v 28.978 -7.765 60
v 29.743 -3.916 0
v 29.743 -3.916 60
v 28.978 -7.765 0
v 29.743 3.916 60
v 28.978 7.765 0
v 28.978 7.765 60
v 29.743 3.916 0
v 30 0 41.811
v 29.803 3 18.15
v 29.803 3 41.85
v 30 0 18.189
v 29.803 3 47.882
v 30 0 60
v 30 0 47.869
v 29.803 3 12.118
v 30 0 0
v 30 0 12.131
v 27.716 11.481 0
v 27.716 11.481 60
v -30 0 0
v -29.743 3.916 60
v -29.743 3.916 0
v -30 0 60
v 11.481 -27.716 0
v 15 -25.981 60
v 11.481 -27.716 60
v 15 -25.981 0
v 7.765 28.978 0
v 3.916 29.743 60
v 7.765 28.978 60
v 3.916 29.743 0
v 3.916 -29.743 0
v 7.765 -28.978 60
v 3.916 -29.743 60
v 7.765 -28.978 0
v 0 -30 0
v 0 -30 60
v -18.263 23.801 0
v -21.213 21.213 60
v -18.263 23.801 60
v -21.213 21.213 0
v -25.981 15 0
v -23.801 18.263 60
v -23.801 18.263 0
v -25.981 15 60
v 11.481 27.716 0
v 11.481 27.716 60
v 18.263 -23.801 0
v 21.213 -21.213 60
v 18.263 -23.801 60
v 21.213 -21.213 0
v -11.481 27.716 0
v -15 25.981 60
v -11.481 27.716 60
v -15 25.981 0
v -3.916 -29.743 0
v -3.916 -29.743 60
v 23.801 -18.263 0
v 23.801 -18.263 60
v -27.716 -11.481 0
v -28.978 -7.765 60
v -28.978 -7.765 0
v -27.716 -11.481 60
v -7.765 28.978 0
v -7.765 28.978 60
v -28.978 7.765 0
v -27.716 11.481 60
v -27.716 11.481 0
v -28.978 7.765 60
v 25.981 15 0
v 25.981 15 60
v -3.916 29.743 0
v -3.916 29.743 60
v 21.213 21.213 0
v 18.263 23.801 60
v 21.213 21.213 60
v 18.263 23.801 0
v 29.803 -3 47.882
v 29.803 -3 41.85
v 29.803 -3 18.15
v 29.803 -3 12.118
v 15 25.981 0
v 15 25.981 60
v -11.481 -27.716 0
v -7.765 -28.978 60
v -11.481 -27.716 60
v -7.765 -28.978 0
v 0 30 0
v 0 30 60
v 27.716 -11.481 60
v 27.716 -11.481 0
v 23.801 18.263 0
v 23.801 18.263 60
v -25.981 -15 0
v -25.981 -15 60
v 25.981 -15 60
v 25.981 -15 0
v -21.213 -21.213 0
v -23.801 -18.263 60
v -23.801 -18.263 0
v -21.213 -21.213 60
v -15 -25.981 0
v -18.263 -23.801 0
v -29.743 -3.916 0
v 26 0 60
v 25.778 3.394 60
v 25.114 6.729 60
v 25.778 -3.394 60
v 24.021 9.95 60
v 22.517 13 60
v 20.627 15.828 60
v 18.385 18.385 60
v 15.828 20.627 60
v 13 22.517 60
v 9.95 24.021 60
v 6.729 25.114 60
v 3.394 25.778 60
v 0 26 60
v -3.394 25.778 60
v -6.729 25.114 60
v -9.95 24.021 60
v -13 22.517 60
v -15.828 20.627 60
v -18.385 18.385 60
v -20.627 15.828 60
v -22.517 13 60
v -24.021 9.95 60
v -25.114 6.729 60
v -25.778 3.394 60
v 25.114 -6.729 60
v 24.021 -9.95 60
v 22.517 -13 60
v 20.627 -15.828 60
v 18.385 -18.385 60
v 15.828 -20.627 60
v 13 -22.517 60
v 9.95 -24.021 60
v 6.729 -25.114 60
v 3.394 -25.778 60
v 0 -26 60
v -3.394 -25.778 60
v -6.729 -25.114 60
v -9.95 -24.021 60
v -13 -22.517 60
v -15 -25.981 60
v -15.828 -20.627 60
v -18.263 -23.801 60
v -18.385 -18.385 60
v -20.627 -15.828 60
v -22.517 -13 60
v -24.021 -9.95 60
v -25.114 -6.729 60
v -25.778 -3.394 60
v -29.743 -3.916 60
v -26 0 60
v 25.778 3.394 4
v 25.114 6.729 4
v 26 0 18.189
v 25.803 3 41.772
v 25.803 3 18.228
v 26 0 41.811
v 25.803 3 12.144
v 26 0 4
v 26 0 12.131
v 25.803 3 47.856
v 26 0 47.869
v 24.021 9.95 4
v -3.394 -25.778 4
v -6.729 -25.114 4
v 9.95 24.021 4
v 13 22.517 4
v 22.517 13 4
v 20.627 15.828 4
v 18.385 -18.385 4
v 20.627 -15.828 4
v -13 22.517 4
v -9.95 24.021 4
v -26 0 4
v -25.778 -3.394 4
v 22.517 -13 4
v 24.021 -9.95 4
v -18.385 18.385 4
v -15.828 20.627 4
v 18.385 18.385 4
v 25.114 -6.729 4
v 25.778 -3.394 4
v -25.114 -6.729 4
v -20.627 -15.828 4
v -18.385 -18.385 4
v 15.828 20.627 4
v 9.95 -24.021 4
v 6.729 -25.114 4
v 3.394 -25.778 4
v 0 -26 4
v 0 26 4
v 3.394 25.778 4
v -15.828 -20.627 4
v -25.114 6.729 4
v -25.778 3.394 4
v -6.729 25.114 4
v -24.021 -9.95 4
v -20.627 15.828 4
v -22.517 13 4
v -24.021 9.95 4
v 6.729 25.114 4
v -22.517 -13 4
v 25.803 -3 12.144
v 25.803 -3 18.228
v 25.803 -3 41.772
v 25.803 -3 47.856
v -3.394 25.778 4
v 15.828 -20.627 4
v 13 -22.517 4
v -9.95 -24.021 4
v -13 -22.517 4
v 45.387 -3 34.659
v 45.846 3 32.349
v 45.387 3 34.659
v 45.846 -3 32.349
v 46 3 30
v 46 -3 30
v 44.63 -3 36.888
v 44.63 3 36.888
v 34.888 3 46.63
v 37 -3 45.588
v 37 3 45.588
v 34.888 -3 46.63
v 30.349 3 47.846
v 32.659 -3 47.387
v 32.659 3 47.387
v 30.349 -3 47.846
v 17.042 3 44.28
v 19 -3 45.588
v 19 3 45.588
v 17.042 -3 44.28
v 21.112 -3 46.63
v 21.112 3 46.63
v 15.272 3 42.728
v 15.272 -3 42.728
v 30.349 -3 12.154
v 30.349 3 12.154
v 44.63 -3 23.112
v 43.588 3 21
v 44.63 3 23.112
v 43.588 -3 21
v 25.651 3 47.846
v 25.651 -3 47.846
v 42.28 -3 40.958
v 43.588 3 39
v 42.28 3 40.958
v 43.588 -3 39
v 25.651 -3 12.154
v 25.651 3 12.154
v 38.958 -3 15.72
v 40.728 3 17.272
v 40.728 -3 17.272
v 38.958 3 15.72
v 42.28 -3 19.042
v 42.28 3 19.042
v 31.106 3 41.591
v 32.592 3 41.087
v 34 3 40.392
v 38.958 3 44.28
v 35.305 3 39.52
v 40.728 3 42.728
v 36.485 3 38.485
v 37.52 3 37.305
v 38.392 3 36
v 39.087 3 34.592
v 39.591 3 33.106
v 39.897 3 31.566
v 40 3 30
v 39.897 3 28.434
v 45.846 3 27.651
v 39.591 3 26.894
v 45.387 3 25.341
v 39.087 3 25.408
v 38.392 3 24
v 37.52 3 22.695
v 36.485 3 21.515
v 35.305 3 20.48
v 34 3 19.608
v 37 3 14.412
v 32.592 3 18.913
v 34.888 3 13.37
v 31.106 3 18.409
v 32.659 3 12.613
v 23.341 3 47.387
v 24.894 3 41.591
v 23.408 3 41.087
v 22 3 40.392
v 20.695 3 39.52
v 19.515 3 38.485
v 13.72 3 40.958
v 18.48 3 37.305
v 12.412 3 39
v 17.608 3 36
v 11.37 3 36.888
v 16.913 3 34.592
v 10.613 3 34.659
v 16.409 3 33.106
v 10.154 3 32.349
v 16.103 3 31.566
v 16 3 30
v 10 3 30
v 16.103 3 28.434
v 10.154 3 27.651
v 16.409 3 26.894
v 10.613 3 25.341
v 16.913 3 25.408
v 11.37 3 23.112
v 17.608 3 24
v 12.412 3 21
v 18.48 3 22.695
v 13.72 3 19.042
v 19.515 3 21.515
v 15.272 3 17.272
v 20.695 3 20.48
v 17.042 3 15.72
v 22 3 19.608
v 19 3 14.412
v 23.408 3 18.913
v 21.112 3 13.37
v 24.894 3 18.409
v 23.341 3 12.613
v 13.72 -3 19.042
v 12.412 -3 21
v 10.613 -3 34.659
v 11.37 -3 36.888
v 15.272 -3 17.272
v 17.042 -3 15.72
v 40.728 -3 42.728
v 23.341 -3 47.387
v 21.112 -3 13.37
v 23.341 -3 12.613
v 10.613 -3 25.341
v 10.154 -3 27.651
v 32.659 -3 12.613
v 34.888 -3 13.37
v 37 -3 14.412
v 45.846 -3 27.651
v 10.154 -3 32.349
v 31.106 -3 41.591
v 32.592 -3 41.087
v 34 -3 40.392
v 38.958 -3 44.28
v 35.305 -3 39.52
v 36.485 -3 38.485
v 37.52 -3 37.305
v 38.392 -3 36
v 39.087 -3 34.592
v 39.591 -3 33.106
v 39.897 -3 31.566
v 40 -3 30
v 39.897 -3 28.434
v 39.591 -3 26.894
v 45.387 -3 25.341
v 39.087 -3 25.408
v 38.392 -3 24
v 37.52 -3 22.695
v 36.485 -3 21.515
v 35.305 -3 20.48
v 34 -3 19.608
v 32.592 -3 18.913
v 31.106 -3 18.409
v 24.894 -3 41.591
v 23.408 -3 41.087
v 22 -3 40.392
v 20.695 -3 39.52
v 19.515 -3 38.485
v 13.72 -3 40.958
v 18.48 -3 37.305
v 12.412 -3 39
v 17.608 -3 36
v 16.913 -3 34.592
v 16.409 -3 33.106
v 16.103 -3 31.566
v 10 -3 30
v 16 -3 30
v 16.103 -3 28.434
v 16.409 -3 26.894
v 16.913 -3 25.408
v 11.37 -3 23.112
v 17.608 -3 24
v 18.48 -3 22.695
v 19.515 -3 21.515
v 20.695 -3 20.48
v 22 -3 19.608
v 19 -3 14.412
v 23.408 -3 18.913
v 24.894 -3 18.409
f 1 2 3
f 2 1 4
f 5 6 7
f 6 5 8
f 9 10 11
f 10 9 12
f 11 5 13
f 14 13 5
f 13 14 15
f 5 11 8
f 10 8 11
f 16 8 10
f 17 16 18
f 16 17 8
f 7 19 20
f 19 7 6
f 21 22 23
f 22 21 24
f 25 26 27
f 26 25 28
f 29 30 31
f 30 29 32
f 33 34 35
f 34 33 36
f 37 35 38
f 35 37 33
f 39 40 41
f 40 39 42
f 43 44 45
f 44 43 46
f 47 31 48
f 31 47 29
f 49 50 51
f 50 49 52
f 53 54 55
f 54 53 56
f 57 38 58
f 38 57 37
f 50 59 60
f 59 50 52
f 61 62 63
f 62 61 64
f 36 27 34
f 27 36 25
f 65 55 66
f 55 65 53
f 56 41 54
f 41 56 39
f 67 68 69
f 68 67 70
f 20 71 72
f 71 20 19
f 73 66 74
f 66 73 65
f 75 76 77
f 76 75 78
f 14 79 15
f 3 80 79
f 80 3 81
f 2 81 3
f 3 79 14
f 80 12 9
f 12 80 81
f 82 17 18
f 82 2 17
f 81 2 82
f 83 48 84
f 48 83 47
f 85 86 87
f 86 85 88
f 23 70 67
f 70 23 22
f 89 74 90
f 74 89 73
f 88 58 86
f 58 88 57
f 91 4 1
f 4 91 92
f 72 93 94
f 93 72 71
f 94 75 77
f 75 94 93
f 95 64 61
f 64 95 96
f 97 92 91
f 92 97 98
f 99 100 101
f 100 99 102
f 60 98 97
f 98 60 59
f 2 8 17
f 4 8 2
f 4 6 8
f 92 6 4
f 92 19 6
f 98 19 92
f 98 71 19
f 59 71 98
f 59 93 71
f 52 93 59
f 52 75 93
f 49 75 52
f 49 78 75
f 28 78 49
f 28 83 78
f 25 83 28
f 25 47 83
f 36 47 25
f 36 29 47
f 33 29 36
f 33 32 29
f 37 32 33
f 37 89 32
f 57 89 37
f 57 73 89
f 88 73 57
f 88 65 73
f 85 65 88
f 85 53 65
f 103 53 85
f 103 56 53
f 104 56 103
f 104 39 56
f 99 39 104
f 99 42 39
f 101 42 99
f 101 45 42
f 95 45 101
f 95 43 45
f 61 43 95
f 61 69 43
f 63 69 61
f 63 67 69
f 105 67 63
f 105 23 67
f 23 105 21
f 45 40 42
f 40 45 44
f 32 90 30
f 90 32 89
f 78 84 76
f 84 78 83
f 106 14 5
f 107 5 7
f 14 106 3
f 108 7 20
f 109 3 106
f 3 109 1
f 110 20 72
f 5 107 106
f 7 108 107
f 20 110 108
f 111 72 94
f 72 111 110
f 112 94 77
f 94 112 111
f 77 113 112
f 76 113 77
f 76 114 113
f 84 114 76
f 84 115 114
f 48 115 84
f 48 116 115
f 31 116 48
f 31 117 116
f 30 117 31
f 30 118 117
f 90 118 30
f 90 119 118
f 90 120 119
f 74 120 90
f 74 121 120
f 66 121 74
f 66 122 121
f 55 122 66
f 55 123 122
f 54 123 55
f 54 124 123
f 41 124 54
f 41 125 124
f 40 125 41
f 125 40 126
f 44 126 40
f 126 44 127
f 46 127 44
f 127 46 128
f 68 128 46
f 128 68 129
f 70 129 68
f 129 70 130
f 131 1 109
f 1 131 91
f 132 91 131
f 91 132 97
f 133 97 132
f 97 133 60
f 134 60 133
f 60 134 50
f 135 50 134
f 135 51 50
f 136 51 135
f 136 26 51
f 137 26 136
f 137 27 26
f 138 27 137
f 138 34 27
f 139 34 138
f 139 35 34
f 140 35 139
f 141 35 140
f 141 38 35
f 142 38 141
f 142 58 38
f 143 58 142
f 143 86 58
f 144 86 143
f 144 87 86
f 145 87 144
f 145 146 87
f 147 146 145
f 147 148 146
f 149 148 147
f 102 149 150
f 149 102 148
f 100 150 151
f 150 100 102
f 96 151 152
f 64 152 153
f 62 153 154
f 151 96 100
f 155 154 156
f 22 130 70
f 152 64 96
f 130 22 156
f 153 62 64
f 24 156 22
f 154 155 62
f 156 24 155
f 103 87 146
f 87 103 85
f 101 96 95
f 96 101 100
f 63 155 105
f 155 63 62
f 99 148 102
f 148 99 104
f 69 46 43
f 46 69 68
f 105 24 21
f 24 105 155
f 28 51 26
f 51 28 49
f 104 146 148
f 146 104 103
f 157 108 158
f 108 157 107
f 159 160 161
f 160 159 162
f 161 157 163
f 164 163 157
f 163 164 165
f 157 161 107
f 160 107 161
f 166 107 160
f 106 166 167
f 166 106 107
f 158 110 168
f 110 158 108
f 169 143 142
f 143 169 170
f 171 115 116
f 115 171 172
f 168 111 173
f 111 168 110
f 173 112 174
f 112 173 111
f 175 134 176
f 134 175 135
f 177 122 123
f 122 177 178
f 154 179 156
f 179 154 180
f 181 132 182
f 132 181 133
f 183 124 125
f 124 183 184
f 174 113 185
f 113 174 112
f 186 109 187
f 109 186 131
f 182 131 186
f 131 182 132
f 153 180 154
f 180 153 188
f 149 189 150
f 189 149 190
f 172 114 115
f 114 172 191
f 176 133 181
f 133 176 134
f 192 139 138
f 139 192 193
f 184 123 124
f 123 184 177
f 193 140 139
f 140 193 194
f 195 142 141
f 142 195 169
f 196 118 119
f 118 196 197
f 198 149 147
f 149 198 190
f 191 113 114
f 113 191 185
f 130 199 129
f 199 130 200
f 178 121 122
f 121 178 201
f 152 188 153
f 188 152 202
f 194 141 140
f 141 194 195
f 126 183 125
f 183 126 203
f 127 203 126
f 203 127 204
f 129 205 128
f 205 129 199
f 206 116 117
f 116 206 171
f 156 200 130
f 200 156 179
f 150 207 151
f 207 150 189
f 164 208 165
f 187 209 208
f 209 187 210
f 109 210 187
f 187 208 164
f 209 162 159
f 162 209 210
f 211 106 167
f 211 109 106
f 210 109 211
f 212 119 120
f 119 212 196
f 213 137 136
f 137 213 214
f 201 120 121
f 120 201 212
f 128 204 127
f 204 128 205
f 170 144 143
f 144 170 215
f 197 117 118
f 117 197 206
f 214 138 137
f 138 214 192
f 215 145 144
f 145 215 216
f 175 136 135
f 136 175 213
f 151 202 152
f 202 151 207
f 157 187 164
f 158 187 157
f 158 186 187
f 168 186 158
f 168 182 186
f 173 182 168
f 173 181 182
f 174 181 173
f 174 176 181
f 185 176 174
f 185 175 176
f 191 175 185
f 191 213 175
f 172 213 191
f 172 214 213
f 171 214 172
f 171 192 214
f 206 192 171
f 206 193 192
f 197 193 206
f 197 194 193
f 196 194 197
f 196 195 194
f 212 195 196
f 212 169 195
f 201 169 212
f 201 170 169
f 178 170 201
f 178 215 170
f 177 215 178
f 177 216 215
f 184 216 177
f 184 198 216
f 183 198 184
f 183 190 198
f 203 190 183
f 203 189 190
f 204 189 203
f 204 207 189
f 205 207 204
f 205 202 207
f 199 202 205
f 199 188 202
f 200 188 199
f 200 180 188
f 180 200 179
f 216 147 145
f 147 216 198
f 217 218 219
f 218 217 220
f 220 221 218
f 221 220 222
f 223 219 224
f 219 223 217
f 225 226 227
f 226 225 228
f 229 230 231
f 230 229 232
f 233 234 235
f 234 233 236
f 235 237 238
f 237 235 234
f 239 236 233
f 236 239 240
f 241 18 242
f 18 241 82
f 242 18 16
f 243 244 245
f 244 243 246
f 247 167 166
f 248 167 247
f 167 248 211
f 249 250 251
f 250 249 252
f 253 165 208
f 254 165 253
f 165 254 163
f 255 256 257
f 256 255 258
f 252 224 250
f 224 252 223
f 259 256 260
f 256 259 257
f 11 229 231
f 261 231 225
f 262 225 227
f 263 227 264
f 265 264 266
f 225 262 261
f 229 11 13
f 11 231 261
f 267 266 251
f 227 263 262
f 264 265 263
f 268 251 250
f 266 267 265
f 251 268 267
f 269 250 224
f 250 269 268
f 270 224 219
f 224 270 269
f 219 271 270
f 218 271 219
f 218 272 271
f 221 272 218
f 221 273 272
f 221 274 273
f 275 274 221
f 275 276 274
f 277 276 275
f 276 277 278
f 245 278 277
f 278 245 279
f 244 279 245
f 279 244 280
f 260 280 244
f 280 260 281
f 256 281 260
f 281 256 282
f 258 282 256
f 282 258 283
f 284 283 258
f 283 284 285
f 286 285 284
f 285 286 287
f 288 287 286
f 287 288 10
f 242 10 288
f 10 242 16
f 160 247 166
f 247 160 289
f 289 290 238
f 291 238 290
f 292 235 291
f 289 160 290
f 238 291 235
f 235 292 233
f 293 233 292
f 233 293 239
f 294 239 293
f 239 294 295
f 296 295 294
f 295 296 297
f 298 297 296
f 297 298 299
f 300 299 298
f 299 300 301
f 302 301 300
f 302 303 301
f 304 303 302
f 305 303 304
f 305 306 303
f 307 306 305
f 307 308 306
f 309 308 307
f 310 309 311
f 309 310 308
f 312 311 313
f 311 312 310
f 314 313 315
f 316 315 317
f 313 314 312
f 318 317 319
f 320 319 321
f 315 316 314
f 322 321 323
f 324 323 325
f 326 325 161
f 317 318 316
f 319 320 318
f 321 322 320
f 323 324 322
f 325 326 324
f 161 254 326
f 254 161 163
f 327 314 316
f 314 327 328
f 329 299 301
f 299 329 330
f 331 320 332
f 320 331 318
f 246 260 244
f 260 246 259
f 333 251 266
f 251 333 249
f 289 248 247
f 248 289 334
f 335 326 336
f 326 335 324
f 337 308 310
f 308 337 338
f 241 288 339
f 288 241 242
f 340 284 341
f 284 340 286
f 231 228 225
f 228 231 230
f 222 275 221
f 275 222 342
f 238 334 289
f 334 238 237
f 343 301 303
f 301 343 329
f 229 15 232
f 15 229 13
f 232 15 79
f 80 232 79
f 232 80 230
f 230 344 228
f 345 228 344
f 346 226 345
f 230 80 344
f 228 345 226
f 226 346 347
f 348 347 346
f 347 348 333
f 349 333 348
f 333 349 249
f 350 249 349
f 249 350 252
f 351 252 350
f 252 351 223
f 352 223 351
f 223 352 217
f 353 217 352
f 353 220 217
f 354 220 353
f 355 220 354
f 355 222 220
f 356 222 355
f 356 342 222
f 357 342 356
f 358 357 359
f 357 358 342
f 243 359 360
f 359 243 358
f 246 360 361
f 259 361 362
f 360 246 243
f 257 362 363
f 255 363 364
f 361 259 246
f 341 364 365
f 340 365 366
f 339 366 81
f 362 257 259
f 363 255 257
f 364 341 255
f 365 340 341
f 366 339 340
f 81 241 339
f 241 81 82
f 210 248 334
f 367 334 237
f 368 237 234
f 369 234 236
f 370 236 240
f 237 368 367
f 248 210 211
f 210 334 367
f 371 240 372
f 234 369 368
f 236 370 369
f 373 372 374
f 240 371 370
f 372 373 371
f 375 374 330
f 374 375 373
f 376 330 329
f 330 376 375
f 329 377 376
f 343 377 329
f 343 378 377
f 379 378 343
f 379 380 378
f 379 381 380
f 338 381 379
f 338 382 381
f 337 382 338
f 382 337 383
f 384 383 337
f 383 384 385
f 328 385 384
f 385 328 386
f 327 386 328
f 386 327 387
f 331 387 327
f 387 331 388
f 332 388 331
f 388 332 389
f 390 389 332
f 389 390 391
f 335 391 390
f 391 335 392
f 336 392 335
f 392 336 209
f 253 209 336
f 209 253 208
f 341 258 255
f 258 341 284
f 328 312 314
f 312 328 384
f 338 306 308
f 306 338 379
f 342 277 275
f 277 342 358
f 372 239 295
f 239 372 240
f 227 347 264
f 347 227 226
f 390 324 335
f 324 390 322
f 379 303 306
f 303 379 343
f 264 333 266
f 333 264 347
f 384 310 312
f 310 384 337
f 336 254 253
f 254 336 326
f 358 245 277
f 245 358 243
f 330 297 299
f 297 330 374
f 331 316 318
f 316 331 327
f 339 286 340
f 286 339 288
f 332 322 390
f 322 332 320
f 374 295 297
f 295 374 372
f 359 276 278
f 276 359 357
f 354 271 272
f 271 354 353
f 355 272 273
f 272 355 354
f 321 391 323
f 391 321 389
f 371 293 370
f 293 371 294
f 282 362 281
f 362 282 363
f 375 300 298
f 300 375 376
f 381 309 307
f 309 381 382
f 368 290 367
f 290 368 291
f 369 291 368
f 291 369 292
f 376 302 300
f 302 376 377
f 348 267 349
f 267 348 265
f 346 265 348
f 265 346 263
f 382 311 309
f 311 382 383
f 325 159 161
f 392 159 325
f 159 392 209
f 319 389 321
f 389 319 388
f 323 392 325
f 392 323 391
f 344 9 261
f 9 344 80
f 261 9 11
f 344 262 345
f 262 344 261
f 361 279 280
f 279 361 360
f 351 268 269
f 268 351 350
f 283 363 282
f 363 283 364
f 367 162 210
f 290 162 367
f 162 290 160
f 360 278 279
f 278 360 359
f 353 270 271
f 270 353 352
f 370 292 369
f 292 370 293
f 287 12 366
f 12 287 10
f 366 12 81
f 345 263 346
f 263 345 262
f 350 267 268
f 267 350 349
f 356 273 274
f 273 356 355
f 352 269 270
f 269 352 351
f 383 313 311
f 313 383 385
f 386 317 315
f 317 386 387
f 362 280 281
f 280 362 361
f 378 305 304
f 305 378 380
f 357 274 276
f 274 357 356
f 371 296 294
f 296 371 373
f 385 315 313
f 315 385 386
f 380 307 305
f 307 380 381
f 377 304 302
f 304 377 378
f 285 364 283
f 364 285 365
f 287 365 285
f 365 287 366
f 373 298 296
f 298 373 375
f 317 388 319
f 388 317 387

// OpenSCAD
// Original EVEngine fixture, dimensions in millimetres.
$fn = 48;
difference() {
    cylinder(h = 60, r = 30);
    translate([0, 0, 4]) cylinder(h = 60, r = 26);
}
translate([28, 0, 30])
    rotate([90, 0, 0])
        difference() {
            cylinder(h = 6, r = 18, center = true);
            cylinder(h = 8, r = 12, center = true);
        }
